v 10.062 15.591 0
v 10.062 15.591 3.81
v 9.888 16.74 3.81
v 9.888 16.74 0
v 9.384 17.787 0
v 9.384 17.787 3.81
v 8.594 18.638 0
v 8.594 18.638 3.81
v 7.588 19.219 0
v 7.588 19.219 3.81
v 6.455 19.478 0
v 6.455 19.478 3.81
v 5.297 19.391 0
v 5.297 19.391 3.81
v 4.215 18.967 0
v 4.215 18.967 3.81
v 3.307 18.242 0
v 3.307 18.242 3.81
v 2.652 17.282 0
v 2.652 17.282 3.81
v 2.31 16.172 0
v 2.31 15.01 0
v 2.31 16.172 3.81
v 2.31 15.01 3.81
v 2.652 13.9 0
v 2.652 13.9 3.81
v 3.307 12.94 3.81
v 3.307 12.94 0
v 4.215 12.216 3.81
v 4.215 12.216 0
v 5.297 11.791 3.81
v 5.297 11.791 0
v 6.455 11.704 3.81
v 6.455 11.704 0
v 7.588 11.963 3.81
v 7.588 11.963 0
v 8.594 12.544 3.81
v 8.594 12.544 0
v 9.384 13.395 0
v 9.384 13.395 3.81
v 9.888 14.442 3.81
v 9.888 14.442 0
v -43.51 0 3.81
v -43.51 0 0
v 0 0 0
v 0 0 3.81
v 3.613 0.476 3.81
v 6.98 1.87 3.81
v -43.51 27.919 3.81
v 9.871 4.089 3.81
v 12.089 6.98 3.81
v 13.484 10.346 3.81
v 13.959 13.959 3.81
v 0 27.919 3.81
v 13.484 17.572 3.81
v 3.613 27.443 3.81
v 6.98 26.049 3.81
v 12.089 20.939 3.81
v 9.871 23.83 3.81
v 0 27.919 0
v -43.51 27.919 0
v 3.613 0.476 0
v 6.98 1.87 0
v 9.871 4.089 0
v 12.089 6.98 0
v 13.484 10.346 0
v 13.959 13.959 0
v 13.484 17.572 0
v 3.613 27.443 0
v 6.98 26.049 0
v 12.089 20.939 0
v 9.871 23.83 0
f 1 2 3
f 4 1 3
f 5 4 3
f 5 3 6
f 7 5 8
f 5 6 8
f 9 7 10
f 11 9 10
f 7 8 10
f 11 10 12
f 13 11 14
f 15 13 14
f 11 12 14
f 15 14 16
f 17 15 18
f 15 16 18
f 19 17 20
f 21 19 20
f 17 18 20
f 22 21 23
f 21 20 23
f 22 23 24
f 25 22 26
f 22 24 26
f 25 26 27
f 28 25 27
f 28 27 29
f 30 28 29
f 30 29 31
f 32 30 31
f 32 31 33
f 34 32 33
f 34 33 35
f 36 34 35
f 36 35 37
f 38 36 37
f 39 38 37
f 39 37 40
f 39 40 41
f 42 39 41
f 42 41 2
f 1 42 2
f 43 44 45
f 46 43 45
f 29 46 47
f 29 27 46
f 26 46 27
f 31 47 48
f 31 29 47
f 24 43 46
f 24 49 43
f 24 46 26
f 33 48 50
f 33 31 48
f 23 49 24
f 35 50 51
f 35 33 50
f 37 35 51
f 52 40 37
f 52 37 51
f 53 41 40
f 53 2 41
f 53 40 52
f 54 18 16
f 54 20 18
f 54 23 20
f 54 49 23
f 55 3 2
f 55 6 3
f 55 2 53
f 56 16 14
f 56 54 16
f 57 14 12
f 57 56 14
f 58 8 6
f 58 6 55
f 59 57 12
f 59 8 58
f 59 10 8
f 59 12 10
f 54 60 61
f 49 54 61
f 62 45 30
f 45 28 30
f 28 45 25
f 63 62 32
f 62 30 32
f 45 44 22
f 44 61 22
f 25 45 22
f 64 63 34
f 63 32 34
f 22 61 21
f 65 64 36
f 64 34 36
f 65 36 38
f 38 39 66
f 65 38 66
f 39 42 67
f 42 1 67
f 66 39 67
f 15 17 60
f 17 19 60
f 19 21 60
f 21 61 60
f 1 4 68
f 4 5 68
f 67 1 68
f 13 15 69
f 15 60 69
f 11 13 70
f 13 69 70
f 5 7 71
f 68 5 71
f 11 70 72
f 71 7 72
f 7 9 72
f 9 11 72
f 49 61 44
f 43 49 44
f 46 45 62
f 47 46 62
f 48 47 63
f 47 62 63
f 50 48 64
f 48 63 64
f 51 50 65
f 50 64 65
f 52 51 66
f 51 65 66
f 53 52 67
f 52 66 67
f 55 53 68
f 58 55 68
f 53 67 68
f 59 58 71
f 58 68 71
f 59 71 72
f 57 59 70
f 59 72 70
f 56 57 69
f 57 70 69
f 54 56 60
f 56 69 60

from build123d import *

# Parameters (mm, degrees)
F1_DEPTH = 3.81
F2_R     = 3.897648
F3_DEPTH = 25.4


with BuildPart() as f1:
    # F0 (on Top) → F1 (new body)
    with BuildSketch(Plane.XY):
        with BuildLine():
            Line((-43.509971, 0), (0, 0))
            ThreePointArc((0, 0), (13.959449, 13.959449), (0, 27.918898))
            Line((0, 27.918898), (-43.509971, 27.918898))
            Line((-43.509971, 27.918898), (-43.509971, 0))
        make_face()
    extrude(amount=F1_DEPTH)

    # F2 (on face) → F3 (cut)
    with BuildSketch(Plane.XY.offset(3.81)):
        with Locations((6.163907, 15.591073)):
            Circle(F2_R)
    extrude(amount=-F3_DEPTH, mode=Mode.SUBTRACT)


solid = f1.part
